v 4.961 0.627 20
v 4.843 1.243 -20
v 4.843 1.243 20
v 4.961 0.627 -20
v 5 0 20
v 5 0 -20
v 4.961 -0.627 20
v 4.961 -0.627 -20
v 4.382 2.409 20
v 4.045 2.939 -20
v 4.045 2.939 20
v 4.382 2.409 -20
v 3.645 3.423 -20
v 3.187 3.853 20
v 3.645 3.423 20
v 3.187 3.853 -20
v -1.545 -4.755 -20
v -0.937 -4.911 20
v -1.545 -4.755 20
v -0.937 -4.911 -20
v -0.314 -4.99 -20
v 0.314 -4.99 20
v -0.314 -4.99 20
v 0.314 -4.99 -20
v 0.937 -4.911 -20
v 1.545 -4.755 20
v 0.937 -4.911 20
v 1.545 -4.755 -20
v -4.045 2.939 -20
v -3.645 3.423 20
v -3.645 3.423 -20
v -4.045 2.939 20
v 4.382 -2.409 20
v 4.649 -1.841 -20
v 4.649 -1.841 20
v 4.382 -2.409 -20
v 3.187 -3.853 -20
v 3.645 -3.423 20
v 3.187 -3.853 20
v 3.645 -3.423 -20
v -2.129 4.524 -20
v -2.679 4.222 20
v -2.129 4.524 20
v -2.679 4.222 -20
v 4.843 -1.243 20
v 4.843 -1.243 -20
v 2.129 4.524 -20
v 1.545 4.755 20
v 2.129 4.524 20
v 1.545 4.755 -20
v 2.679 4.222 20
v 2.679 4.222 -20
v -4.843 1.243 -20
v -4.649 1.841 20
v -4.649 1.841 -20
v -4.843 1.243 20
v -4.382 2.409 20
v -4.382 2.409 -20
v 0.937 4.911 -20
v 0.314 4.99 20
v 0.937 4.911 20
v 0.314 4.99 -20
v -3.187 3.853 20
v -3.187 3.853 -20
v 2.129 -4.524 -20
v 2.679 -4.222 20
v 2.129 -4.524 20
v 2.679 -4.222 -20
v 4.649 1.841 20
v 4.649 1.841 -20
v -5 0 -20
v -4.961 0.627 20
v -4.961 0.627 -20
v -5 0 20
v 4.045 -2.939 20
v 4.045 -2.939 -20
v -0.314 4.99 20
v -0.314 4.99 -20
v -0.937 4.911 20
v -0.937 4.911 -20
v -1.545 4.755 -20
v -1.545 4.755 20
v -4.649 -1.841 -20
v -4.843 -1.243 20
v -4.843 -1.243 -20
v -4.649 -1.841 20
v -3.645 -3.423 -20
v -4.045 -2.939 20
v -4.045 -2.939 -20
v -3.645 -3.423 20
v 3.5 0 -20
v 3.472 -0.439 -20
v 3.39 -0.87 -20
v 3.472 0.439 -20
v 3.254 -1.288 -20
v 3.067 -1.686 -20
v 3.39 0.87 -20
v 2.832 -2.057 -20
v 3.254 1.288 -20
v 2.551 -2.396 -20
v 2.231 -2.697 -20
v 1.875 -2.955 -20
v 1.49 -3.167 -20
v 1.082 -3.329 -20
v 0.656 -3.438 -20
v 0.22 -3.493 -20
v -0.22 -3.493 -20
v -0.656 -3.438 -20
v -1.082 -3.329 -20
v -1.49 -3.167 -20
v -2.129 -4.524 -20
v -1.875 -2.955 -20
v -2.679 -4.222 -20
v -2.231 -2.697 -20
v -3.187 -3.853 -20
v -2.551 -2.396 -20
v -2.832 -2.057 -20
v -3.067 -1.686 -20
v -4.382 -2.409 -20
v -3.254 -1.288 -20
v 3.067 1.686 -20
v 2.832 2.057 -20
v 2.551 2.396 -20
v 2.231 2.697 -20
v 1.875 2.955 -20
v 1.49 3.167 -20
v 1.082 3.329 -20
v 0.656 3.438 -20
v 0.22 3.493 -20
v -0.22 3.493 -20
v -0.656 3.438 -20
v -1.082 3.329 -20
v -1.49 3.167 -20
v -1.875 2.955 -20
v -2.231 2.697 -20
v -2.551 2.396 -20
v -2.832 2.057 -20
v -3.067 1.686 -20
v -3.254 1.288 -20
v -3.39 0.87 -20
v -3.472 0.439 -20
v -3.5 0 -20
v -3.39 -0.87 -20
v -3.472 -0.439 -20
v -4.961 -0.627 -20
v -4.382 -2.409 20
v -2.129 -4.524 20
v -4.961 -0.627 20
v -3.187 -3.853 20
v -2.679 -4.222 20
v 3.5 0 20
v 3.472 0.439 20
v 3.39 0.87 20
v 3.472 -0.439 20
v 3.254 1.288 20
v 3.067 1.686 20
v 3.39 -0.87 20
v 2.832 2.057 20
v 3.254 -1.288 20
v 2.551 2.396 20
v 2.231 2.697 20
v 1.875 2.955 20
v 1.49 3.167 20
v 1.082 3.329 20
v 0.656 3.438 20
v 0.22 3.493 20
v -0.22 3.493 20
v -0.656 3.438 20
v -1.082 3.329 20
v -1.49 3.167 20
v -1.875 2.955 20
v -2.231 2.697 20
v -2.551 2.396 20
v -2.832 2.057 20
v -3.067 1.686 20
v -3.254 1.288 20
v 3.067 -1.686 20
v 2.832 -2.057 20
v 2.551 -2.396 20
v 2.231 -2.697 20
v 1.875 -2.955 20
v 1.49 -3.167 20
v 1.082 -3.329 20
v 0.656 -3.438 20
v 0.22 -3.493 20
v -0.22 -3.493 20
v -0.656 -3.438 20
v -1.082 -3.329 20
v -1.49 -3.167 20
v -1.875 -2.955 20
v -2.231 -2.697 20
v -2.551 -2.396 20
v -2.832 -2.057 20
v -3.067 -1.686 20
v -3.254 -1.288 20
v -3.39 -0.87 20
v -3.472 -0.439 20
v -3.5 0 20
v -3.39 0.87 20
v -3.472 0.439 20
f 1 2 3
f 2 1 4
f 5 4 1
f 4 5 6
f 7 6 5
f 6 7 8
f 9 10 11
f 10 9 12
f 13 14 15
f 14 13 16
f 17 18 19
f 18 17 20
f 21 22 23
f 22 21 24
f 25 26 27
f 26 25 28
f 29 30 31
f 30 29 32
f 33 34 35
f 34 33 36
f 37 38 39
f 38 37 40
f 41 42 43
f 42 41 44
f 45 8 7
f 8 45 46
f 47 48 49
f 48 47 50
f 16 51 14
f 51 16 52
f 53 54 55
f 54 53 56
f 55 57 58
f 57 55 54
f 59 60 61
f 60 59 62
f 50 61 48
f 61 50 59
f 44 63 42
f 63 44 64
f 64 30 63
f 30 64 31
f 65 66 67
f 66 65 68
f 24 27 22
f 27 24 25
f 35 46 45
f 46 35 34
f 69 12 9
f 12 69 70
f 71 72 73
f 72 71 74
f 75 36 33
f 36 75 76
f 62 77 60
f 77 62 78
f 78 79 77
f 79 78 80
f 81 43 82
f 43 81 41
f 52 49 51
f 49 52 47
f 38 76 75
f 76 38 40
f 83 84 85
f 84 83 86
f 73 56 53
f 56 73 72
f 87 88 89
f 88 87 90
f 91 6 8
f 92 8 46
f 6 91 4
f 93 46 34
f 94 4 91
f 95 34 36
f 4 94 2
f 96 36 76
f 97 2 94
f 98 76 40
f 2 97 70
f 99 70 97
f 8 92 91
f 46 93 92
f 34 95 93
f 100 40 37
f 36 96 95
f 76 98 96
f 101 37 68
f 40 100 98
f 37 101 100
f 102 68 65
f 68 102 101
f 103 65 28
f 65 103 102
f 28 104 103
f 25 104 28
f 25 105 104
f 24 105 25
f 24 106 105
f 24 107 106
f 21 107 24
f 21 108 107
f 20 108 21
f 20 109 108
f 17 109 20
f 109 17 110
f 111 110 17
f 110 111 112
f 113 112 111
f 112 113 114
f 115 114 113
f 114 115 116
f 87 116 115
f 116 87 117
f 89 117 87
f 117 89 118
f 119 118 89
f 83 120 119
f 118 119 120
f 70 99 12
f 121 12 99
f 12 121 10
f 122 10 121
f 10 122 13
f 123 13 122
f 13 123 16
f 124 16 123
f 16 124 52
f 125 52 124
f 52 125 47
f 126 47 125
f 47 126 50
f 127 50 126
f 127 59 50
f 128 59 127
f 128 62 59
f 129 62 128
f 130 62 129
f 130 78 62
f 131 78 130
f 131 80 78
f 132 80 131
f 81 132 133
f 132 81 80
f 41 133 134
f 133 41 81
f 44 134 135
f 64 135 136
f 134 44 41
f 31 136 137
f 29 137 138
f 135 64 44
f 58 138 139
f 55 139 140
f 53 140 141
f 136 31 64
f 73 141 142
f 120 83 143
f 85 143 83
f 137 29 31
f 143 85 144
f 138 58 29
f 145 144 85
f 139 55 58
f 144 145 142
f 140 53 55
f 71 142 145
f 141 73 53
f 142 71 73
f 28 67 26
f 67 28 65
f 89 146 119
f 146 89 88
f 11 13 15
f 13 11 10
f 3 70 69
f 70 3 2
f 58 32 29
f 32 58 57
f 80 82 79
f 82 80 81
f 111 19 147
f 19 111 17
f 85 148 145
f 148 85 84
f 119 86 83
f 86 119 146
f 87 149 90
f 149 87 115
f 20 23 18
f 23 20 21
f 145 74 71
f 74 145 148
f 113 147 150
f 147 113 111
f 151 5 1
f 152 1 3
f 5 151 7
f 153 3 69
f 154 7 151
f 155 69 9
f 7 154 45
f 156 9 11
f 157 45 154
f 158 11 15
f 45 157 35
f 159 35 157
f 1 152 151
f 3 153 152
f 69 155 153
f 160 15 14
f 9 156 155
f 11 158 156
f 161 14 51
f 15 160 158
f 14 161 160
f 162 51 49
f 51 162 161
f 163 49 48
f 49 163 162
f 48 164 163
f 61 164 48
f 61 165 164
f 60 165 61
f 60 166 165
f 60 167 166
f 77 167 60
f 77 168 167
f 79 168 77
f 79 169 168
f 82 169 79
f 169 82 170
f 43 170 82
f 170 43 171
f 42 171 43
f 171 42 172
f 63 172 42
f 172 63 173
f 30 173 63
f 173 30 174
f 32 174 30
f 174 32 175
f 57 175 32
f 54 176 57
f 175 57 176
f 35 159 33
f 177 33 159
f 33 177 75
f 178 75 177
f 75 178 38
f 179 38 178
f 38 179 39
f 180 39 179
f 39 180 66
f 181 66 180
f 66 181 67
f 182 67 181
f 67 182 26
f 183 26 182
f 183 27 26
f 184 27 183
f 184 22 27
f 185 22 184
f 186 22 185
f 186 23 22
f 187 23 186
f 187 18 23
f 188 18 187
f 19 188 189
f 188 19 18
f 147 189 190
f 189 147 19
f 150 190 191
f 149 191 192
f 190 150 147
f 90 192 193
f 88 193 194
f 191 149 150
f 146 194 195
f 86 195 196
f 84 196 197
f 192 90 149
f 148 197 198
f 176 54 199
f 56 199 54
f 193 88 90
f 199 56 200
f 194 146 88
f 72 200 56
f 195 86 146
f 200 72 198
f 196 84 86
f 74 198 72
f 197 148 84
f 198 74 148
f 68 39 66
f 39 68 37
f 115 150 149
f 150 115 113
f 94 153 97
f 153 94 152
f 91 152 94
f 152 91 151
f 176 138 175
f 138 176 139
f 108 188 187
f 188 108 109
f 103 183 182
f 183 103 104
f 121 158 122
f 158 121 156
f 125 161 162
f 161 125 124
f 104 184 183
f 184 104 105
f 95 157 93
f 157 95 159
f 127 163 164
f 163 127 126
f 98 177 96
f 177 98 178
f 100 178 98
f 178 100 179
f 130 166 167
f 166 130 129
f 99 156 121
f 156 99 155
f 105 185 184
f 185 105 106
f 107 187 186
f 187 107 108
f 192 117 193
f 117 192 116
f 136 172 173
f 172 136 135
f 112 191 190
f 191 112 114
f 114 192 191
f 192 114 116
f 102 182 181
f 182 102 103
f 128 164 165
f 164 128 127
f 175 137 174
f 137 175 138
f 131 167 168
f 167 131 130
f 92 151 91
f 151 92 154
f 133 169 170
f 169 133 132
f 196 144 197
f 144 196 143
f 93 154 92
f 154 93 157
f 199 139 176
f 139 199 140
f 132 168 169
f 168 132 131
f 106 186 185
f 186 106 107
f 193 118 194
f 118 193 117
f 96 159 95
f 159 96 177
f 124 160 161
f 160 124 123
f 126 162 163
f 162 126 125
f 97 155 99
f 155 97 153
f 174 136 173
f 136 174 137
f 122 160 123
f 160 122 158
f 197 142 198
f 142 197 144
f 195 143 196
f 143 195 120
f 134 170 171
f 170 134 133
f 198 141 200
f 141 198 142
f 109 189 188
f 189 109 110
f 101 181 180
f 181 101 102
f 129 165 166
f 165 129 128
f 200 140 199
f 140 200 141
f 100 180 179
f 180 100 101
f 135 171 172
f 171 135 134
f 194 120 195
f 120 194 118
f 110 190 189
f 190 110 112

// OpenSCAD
$fn = 50;


difference() {
	union() {
		translate(v = [0, 0, -20.0000000000]) {
			cylinder(h = 40, r = 5.0000000000);
		}
	}
	union() {
		translate(v = [0, 0, -100.0000000000]) {
			cylinder(h = 200, r = 3.5000000000);
		}
	}
}
